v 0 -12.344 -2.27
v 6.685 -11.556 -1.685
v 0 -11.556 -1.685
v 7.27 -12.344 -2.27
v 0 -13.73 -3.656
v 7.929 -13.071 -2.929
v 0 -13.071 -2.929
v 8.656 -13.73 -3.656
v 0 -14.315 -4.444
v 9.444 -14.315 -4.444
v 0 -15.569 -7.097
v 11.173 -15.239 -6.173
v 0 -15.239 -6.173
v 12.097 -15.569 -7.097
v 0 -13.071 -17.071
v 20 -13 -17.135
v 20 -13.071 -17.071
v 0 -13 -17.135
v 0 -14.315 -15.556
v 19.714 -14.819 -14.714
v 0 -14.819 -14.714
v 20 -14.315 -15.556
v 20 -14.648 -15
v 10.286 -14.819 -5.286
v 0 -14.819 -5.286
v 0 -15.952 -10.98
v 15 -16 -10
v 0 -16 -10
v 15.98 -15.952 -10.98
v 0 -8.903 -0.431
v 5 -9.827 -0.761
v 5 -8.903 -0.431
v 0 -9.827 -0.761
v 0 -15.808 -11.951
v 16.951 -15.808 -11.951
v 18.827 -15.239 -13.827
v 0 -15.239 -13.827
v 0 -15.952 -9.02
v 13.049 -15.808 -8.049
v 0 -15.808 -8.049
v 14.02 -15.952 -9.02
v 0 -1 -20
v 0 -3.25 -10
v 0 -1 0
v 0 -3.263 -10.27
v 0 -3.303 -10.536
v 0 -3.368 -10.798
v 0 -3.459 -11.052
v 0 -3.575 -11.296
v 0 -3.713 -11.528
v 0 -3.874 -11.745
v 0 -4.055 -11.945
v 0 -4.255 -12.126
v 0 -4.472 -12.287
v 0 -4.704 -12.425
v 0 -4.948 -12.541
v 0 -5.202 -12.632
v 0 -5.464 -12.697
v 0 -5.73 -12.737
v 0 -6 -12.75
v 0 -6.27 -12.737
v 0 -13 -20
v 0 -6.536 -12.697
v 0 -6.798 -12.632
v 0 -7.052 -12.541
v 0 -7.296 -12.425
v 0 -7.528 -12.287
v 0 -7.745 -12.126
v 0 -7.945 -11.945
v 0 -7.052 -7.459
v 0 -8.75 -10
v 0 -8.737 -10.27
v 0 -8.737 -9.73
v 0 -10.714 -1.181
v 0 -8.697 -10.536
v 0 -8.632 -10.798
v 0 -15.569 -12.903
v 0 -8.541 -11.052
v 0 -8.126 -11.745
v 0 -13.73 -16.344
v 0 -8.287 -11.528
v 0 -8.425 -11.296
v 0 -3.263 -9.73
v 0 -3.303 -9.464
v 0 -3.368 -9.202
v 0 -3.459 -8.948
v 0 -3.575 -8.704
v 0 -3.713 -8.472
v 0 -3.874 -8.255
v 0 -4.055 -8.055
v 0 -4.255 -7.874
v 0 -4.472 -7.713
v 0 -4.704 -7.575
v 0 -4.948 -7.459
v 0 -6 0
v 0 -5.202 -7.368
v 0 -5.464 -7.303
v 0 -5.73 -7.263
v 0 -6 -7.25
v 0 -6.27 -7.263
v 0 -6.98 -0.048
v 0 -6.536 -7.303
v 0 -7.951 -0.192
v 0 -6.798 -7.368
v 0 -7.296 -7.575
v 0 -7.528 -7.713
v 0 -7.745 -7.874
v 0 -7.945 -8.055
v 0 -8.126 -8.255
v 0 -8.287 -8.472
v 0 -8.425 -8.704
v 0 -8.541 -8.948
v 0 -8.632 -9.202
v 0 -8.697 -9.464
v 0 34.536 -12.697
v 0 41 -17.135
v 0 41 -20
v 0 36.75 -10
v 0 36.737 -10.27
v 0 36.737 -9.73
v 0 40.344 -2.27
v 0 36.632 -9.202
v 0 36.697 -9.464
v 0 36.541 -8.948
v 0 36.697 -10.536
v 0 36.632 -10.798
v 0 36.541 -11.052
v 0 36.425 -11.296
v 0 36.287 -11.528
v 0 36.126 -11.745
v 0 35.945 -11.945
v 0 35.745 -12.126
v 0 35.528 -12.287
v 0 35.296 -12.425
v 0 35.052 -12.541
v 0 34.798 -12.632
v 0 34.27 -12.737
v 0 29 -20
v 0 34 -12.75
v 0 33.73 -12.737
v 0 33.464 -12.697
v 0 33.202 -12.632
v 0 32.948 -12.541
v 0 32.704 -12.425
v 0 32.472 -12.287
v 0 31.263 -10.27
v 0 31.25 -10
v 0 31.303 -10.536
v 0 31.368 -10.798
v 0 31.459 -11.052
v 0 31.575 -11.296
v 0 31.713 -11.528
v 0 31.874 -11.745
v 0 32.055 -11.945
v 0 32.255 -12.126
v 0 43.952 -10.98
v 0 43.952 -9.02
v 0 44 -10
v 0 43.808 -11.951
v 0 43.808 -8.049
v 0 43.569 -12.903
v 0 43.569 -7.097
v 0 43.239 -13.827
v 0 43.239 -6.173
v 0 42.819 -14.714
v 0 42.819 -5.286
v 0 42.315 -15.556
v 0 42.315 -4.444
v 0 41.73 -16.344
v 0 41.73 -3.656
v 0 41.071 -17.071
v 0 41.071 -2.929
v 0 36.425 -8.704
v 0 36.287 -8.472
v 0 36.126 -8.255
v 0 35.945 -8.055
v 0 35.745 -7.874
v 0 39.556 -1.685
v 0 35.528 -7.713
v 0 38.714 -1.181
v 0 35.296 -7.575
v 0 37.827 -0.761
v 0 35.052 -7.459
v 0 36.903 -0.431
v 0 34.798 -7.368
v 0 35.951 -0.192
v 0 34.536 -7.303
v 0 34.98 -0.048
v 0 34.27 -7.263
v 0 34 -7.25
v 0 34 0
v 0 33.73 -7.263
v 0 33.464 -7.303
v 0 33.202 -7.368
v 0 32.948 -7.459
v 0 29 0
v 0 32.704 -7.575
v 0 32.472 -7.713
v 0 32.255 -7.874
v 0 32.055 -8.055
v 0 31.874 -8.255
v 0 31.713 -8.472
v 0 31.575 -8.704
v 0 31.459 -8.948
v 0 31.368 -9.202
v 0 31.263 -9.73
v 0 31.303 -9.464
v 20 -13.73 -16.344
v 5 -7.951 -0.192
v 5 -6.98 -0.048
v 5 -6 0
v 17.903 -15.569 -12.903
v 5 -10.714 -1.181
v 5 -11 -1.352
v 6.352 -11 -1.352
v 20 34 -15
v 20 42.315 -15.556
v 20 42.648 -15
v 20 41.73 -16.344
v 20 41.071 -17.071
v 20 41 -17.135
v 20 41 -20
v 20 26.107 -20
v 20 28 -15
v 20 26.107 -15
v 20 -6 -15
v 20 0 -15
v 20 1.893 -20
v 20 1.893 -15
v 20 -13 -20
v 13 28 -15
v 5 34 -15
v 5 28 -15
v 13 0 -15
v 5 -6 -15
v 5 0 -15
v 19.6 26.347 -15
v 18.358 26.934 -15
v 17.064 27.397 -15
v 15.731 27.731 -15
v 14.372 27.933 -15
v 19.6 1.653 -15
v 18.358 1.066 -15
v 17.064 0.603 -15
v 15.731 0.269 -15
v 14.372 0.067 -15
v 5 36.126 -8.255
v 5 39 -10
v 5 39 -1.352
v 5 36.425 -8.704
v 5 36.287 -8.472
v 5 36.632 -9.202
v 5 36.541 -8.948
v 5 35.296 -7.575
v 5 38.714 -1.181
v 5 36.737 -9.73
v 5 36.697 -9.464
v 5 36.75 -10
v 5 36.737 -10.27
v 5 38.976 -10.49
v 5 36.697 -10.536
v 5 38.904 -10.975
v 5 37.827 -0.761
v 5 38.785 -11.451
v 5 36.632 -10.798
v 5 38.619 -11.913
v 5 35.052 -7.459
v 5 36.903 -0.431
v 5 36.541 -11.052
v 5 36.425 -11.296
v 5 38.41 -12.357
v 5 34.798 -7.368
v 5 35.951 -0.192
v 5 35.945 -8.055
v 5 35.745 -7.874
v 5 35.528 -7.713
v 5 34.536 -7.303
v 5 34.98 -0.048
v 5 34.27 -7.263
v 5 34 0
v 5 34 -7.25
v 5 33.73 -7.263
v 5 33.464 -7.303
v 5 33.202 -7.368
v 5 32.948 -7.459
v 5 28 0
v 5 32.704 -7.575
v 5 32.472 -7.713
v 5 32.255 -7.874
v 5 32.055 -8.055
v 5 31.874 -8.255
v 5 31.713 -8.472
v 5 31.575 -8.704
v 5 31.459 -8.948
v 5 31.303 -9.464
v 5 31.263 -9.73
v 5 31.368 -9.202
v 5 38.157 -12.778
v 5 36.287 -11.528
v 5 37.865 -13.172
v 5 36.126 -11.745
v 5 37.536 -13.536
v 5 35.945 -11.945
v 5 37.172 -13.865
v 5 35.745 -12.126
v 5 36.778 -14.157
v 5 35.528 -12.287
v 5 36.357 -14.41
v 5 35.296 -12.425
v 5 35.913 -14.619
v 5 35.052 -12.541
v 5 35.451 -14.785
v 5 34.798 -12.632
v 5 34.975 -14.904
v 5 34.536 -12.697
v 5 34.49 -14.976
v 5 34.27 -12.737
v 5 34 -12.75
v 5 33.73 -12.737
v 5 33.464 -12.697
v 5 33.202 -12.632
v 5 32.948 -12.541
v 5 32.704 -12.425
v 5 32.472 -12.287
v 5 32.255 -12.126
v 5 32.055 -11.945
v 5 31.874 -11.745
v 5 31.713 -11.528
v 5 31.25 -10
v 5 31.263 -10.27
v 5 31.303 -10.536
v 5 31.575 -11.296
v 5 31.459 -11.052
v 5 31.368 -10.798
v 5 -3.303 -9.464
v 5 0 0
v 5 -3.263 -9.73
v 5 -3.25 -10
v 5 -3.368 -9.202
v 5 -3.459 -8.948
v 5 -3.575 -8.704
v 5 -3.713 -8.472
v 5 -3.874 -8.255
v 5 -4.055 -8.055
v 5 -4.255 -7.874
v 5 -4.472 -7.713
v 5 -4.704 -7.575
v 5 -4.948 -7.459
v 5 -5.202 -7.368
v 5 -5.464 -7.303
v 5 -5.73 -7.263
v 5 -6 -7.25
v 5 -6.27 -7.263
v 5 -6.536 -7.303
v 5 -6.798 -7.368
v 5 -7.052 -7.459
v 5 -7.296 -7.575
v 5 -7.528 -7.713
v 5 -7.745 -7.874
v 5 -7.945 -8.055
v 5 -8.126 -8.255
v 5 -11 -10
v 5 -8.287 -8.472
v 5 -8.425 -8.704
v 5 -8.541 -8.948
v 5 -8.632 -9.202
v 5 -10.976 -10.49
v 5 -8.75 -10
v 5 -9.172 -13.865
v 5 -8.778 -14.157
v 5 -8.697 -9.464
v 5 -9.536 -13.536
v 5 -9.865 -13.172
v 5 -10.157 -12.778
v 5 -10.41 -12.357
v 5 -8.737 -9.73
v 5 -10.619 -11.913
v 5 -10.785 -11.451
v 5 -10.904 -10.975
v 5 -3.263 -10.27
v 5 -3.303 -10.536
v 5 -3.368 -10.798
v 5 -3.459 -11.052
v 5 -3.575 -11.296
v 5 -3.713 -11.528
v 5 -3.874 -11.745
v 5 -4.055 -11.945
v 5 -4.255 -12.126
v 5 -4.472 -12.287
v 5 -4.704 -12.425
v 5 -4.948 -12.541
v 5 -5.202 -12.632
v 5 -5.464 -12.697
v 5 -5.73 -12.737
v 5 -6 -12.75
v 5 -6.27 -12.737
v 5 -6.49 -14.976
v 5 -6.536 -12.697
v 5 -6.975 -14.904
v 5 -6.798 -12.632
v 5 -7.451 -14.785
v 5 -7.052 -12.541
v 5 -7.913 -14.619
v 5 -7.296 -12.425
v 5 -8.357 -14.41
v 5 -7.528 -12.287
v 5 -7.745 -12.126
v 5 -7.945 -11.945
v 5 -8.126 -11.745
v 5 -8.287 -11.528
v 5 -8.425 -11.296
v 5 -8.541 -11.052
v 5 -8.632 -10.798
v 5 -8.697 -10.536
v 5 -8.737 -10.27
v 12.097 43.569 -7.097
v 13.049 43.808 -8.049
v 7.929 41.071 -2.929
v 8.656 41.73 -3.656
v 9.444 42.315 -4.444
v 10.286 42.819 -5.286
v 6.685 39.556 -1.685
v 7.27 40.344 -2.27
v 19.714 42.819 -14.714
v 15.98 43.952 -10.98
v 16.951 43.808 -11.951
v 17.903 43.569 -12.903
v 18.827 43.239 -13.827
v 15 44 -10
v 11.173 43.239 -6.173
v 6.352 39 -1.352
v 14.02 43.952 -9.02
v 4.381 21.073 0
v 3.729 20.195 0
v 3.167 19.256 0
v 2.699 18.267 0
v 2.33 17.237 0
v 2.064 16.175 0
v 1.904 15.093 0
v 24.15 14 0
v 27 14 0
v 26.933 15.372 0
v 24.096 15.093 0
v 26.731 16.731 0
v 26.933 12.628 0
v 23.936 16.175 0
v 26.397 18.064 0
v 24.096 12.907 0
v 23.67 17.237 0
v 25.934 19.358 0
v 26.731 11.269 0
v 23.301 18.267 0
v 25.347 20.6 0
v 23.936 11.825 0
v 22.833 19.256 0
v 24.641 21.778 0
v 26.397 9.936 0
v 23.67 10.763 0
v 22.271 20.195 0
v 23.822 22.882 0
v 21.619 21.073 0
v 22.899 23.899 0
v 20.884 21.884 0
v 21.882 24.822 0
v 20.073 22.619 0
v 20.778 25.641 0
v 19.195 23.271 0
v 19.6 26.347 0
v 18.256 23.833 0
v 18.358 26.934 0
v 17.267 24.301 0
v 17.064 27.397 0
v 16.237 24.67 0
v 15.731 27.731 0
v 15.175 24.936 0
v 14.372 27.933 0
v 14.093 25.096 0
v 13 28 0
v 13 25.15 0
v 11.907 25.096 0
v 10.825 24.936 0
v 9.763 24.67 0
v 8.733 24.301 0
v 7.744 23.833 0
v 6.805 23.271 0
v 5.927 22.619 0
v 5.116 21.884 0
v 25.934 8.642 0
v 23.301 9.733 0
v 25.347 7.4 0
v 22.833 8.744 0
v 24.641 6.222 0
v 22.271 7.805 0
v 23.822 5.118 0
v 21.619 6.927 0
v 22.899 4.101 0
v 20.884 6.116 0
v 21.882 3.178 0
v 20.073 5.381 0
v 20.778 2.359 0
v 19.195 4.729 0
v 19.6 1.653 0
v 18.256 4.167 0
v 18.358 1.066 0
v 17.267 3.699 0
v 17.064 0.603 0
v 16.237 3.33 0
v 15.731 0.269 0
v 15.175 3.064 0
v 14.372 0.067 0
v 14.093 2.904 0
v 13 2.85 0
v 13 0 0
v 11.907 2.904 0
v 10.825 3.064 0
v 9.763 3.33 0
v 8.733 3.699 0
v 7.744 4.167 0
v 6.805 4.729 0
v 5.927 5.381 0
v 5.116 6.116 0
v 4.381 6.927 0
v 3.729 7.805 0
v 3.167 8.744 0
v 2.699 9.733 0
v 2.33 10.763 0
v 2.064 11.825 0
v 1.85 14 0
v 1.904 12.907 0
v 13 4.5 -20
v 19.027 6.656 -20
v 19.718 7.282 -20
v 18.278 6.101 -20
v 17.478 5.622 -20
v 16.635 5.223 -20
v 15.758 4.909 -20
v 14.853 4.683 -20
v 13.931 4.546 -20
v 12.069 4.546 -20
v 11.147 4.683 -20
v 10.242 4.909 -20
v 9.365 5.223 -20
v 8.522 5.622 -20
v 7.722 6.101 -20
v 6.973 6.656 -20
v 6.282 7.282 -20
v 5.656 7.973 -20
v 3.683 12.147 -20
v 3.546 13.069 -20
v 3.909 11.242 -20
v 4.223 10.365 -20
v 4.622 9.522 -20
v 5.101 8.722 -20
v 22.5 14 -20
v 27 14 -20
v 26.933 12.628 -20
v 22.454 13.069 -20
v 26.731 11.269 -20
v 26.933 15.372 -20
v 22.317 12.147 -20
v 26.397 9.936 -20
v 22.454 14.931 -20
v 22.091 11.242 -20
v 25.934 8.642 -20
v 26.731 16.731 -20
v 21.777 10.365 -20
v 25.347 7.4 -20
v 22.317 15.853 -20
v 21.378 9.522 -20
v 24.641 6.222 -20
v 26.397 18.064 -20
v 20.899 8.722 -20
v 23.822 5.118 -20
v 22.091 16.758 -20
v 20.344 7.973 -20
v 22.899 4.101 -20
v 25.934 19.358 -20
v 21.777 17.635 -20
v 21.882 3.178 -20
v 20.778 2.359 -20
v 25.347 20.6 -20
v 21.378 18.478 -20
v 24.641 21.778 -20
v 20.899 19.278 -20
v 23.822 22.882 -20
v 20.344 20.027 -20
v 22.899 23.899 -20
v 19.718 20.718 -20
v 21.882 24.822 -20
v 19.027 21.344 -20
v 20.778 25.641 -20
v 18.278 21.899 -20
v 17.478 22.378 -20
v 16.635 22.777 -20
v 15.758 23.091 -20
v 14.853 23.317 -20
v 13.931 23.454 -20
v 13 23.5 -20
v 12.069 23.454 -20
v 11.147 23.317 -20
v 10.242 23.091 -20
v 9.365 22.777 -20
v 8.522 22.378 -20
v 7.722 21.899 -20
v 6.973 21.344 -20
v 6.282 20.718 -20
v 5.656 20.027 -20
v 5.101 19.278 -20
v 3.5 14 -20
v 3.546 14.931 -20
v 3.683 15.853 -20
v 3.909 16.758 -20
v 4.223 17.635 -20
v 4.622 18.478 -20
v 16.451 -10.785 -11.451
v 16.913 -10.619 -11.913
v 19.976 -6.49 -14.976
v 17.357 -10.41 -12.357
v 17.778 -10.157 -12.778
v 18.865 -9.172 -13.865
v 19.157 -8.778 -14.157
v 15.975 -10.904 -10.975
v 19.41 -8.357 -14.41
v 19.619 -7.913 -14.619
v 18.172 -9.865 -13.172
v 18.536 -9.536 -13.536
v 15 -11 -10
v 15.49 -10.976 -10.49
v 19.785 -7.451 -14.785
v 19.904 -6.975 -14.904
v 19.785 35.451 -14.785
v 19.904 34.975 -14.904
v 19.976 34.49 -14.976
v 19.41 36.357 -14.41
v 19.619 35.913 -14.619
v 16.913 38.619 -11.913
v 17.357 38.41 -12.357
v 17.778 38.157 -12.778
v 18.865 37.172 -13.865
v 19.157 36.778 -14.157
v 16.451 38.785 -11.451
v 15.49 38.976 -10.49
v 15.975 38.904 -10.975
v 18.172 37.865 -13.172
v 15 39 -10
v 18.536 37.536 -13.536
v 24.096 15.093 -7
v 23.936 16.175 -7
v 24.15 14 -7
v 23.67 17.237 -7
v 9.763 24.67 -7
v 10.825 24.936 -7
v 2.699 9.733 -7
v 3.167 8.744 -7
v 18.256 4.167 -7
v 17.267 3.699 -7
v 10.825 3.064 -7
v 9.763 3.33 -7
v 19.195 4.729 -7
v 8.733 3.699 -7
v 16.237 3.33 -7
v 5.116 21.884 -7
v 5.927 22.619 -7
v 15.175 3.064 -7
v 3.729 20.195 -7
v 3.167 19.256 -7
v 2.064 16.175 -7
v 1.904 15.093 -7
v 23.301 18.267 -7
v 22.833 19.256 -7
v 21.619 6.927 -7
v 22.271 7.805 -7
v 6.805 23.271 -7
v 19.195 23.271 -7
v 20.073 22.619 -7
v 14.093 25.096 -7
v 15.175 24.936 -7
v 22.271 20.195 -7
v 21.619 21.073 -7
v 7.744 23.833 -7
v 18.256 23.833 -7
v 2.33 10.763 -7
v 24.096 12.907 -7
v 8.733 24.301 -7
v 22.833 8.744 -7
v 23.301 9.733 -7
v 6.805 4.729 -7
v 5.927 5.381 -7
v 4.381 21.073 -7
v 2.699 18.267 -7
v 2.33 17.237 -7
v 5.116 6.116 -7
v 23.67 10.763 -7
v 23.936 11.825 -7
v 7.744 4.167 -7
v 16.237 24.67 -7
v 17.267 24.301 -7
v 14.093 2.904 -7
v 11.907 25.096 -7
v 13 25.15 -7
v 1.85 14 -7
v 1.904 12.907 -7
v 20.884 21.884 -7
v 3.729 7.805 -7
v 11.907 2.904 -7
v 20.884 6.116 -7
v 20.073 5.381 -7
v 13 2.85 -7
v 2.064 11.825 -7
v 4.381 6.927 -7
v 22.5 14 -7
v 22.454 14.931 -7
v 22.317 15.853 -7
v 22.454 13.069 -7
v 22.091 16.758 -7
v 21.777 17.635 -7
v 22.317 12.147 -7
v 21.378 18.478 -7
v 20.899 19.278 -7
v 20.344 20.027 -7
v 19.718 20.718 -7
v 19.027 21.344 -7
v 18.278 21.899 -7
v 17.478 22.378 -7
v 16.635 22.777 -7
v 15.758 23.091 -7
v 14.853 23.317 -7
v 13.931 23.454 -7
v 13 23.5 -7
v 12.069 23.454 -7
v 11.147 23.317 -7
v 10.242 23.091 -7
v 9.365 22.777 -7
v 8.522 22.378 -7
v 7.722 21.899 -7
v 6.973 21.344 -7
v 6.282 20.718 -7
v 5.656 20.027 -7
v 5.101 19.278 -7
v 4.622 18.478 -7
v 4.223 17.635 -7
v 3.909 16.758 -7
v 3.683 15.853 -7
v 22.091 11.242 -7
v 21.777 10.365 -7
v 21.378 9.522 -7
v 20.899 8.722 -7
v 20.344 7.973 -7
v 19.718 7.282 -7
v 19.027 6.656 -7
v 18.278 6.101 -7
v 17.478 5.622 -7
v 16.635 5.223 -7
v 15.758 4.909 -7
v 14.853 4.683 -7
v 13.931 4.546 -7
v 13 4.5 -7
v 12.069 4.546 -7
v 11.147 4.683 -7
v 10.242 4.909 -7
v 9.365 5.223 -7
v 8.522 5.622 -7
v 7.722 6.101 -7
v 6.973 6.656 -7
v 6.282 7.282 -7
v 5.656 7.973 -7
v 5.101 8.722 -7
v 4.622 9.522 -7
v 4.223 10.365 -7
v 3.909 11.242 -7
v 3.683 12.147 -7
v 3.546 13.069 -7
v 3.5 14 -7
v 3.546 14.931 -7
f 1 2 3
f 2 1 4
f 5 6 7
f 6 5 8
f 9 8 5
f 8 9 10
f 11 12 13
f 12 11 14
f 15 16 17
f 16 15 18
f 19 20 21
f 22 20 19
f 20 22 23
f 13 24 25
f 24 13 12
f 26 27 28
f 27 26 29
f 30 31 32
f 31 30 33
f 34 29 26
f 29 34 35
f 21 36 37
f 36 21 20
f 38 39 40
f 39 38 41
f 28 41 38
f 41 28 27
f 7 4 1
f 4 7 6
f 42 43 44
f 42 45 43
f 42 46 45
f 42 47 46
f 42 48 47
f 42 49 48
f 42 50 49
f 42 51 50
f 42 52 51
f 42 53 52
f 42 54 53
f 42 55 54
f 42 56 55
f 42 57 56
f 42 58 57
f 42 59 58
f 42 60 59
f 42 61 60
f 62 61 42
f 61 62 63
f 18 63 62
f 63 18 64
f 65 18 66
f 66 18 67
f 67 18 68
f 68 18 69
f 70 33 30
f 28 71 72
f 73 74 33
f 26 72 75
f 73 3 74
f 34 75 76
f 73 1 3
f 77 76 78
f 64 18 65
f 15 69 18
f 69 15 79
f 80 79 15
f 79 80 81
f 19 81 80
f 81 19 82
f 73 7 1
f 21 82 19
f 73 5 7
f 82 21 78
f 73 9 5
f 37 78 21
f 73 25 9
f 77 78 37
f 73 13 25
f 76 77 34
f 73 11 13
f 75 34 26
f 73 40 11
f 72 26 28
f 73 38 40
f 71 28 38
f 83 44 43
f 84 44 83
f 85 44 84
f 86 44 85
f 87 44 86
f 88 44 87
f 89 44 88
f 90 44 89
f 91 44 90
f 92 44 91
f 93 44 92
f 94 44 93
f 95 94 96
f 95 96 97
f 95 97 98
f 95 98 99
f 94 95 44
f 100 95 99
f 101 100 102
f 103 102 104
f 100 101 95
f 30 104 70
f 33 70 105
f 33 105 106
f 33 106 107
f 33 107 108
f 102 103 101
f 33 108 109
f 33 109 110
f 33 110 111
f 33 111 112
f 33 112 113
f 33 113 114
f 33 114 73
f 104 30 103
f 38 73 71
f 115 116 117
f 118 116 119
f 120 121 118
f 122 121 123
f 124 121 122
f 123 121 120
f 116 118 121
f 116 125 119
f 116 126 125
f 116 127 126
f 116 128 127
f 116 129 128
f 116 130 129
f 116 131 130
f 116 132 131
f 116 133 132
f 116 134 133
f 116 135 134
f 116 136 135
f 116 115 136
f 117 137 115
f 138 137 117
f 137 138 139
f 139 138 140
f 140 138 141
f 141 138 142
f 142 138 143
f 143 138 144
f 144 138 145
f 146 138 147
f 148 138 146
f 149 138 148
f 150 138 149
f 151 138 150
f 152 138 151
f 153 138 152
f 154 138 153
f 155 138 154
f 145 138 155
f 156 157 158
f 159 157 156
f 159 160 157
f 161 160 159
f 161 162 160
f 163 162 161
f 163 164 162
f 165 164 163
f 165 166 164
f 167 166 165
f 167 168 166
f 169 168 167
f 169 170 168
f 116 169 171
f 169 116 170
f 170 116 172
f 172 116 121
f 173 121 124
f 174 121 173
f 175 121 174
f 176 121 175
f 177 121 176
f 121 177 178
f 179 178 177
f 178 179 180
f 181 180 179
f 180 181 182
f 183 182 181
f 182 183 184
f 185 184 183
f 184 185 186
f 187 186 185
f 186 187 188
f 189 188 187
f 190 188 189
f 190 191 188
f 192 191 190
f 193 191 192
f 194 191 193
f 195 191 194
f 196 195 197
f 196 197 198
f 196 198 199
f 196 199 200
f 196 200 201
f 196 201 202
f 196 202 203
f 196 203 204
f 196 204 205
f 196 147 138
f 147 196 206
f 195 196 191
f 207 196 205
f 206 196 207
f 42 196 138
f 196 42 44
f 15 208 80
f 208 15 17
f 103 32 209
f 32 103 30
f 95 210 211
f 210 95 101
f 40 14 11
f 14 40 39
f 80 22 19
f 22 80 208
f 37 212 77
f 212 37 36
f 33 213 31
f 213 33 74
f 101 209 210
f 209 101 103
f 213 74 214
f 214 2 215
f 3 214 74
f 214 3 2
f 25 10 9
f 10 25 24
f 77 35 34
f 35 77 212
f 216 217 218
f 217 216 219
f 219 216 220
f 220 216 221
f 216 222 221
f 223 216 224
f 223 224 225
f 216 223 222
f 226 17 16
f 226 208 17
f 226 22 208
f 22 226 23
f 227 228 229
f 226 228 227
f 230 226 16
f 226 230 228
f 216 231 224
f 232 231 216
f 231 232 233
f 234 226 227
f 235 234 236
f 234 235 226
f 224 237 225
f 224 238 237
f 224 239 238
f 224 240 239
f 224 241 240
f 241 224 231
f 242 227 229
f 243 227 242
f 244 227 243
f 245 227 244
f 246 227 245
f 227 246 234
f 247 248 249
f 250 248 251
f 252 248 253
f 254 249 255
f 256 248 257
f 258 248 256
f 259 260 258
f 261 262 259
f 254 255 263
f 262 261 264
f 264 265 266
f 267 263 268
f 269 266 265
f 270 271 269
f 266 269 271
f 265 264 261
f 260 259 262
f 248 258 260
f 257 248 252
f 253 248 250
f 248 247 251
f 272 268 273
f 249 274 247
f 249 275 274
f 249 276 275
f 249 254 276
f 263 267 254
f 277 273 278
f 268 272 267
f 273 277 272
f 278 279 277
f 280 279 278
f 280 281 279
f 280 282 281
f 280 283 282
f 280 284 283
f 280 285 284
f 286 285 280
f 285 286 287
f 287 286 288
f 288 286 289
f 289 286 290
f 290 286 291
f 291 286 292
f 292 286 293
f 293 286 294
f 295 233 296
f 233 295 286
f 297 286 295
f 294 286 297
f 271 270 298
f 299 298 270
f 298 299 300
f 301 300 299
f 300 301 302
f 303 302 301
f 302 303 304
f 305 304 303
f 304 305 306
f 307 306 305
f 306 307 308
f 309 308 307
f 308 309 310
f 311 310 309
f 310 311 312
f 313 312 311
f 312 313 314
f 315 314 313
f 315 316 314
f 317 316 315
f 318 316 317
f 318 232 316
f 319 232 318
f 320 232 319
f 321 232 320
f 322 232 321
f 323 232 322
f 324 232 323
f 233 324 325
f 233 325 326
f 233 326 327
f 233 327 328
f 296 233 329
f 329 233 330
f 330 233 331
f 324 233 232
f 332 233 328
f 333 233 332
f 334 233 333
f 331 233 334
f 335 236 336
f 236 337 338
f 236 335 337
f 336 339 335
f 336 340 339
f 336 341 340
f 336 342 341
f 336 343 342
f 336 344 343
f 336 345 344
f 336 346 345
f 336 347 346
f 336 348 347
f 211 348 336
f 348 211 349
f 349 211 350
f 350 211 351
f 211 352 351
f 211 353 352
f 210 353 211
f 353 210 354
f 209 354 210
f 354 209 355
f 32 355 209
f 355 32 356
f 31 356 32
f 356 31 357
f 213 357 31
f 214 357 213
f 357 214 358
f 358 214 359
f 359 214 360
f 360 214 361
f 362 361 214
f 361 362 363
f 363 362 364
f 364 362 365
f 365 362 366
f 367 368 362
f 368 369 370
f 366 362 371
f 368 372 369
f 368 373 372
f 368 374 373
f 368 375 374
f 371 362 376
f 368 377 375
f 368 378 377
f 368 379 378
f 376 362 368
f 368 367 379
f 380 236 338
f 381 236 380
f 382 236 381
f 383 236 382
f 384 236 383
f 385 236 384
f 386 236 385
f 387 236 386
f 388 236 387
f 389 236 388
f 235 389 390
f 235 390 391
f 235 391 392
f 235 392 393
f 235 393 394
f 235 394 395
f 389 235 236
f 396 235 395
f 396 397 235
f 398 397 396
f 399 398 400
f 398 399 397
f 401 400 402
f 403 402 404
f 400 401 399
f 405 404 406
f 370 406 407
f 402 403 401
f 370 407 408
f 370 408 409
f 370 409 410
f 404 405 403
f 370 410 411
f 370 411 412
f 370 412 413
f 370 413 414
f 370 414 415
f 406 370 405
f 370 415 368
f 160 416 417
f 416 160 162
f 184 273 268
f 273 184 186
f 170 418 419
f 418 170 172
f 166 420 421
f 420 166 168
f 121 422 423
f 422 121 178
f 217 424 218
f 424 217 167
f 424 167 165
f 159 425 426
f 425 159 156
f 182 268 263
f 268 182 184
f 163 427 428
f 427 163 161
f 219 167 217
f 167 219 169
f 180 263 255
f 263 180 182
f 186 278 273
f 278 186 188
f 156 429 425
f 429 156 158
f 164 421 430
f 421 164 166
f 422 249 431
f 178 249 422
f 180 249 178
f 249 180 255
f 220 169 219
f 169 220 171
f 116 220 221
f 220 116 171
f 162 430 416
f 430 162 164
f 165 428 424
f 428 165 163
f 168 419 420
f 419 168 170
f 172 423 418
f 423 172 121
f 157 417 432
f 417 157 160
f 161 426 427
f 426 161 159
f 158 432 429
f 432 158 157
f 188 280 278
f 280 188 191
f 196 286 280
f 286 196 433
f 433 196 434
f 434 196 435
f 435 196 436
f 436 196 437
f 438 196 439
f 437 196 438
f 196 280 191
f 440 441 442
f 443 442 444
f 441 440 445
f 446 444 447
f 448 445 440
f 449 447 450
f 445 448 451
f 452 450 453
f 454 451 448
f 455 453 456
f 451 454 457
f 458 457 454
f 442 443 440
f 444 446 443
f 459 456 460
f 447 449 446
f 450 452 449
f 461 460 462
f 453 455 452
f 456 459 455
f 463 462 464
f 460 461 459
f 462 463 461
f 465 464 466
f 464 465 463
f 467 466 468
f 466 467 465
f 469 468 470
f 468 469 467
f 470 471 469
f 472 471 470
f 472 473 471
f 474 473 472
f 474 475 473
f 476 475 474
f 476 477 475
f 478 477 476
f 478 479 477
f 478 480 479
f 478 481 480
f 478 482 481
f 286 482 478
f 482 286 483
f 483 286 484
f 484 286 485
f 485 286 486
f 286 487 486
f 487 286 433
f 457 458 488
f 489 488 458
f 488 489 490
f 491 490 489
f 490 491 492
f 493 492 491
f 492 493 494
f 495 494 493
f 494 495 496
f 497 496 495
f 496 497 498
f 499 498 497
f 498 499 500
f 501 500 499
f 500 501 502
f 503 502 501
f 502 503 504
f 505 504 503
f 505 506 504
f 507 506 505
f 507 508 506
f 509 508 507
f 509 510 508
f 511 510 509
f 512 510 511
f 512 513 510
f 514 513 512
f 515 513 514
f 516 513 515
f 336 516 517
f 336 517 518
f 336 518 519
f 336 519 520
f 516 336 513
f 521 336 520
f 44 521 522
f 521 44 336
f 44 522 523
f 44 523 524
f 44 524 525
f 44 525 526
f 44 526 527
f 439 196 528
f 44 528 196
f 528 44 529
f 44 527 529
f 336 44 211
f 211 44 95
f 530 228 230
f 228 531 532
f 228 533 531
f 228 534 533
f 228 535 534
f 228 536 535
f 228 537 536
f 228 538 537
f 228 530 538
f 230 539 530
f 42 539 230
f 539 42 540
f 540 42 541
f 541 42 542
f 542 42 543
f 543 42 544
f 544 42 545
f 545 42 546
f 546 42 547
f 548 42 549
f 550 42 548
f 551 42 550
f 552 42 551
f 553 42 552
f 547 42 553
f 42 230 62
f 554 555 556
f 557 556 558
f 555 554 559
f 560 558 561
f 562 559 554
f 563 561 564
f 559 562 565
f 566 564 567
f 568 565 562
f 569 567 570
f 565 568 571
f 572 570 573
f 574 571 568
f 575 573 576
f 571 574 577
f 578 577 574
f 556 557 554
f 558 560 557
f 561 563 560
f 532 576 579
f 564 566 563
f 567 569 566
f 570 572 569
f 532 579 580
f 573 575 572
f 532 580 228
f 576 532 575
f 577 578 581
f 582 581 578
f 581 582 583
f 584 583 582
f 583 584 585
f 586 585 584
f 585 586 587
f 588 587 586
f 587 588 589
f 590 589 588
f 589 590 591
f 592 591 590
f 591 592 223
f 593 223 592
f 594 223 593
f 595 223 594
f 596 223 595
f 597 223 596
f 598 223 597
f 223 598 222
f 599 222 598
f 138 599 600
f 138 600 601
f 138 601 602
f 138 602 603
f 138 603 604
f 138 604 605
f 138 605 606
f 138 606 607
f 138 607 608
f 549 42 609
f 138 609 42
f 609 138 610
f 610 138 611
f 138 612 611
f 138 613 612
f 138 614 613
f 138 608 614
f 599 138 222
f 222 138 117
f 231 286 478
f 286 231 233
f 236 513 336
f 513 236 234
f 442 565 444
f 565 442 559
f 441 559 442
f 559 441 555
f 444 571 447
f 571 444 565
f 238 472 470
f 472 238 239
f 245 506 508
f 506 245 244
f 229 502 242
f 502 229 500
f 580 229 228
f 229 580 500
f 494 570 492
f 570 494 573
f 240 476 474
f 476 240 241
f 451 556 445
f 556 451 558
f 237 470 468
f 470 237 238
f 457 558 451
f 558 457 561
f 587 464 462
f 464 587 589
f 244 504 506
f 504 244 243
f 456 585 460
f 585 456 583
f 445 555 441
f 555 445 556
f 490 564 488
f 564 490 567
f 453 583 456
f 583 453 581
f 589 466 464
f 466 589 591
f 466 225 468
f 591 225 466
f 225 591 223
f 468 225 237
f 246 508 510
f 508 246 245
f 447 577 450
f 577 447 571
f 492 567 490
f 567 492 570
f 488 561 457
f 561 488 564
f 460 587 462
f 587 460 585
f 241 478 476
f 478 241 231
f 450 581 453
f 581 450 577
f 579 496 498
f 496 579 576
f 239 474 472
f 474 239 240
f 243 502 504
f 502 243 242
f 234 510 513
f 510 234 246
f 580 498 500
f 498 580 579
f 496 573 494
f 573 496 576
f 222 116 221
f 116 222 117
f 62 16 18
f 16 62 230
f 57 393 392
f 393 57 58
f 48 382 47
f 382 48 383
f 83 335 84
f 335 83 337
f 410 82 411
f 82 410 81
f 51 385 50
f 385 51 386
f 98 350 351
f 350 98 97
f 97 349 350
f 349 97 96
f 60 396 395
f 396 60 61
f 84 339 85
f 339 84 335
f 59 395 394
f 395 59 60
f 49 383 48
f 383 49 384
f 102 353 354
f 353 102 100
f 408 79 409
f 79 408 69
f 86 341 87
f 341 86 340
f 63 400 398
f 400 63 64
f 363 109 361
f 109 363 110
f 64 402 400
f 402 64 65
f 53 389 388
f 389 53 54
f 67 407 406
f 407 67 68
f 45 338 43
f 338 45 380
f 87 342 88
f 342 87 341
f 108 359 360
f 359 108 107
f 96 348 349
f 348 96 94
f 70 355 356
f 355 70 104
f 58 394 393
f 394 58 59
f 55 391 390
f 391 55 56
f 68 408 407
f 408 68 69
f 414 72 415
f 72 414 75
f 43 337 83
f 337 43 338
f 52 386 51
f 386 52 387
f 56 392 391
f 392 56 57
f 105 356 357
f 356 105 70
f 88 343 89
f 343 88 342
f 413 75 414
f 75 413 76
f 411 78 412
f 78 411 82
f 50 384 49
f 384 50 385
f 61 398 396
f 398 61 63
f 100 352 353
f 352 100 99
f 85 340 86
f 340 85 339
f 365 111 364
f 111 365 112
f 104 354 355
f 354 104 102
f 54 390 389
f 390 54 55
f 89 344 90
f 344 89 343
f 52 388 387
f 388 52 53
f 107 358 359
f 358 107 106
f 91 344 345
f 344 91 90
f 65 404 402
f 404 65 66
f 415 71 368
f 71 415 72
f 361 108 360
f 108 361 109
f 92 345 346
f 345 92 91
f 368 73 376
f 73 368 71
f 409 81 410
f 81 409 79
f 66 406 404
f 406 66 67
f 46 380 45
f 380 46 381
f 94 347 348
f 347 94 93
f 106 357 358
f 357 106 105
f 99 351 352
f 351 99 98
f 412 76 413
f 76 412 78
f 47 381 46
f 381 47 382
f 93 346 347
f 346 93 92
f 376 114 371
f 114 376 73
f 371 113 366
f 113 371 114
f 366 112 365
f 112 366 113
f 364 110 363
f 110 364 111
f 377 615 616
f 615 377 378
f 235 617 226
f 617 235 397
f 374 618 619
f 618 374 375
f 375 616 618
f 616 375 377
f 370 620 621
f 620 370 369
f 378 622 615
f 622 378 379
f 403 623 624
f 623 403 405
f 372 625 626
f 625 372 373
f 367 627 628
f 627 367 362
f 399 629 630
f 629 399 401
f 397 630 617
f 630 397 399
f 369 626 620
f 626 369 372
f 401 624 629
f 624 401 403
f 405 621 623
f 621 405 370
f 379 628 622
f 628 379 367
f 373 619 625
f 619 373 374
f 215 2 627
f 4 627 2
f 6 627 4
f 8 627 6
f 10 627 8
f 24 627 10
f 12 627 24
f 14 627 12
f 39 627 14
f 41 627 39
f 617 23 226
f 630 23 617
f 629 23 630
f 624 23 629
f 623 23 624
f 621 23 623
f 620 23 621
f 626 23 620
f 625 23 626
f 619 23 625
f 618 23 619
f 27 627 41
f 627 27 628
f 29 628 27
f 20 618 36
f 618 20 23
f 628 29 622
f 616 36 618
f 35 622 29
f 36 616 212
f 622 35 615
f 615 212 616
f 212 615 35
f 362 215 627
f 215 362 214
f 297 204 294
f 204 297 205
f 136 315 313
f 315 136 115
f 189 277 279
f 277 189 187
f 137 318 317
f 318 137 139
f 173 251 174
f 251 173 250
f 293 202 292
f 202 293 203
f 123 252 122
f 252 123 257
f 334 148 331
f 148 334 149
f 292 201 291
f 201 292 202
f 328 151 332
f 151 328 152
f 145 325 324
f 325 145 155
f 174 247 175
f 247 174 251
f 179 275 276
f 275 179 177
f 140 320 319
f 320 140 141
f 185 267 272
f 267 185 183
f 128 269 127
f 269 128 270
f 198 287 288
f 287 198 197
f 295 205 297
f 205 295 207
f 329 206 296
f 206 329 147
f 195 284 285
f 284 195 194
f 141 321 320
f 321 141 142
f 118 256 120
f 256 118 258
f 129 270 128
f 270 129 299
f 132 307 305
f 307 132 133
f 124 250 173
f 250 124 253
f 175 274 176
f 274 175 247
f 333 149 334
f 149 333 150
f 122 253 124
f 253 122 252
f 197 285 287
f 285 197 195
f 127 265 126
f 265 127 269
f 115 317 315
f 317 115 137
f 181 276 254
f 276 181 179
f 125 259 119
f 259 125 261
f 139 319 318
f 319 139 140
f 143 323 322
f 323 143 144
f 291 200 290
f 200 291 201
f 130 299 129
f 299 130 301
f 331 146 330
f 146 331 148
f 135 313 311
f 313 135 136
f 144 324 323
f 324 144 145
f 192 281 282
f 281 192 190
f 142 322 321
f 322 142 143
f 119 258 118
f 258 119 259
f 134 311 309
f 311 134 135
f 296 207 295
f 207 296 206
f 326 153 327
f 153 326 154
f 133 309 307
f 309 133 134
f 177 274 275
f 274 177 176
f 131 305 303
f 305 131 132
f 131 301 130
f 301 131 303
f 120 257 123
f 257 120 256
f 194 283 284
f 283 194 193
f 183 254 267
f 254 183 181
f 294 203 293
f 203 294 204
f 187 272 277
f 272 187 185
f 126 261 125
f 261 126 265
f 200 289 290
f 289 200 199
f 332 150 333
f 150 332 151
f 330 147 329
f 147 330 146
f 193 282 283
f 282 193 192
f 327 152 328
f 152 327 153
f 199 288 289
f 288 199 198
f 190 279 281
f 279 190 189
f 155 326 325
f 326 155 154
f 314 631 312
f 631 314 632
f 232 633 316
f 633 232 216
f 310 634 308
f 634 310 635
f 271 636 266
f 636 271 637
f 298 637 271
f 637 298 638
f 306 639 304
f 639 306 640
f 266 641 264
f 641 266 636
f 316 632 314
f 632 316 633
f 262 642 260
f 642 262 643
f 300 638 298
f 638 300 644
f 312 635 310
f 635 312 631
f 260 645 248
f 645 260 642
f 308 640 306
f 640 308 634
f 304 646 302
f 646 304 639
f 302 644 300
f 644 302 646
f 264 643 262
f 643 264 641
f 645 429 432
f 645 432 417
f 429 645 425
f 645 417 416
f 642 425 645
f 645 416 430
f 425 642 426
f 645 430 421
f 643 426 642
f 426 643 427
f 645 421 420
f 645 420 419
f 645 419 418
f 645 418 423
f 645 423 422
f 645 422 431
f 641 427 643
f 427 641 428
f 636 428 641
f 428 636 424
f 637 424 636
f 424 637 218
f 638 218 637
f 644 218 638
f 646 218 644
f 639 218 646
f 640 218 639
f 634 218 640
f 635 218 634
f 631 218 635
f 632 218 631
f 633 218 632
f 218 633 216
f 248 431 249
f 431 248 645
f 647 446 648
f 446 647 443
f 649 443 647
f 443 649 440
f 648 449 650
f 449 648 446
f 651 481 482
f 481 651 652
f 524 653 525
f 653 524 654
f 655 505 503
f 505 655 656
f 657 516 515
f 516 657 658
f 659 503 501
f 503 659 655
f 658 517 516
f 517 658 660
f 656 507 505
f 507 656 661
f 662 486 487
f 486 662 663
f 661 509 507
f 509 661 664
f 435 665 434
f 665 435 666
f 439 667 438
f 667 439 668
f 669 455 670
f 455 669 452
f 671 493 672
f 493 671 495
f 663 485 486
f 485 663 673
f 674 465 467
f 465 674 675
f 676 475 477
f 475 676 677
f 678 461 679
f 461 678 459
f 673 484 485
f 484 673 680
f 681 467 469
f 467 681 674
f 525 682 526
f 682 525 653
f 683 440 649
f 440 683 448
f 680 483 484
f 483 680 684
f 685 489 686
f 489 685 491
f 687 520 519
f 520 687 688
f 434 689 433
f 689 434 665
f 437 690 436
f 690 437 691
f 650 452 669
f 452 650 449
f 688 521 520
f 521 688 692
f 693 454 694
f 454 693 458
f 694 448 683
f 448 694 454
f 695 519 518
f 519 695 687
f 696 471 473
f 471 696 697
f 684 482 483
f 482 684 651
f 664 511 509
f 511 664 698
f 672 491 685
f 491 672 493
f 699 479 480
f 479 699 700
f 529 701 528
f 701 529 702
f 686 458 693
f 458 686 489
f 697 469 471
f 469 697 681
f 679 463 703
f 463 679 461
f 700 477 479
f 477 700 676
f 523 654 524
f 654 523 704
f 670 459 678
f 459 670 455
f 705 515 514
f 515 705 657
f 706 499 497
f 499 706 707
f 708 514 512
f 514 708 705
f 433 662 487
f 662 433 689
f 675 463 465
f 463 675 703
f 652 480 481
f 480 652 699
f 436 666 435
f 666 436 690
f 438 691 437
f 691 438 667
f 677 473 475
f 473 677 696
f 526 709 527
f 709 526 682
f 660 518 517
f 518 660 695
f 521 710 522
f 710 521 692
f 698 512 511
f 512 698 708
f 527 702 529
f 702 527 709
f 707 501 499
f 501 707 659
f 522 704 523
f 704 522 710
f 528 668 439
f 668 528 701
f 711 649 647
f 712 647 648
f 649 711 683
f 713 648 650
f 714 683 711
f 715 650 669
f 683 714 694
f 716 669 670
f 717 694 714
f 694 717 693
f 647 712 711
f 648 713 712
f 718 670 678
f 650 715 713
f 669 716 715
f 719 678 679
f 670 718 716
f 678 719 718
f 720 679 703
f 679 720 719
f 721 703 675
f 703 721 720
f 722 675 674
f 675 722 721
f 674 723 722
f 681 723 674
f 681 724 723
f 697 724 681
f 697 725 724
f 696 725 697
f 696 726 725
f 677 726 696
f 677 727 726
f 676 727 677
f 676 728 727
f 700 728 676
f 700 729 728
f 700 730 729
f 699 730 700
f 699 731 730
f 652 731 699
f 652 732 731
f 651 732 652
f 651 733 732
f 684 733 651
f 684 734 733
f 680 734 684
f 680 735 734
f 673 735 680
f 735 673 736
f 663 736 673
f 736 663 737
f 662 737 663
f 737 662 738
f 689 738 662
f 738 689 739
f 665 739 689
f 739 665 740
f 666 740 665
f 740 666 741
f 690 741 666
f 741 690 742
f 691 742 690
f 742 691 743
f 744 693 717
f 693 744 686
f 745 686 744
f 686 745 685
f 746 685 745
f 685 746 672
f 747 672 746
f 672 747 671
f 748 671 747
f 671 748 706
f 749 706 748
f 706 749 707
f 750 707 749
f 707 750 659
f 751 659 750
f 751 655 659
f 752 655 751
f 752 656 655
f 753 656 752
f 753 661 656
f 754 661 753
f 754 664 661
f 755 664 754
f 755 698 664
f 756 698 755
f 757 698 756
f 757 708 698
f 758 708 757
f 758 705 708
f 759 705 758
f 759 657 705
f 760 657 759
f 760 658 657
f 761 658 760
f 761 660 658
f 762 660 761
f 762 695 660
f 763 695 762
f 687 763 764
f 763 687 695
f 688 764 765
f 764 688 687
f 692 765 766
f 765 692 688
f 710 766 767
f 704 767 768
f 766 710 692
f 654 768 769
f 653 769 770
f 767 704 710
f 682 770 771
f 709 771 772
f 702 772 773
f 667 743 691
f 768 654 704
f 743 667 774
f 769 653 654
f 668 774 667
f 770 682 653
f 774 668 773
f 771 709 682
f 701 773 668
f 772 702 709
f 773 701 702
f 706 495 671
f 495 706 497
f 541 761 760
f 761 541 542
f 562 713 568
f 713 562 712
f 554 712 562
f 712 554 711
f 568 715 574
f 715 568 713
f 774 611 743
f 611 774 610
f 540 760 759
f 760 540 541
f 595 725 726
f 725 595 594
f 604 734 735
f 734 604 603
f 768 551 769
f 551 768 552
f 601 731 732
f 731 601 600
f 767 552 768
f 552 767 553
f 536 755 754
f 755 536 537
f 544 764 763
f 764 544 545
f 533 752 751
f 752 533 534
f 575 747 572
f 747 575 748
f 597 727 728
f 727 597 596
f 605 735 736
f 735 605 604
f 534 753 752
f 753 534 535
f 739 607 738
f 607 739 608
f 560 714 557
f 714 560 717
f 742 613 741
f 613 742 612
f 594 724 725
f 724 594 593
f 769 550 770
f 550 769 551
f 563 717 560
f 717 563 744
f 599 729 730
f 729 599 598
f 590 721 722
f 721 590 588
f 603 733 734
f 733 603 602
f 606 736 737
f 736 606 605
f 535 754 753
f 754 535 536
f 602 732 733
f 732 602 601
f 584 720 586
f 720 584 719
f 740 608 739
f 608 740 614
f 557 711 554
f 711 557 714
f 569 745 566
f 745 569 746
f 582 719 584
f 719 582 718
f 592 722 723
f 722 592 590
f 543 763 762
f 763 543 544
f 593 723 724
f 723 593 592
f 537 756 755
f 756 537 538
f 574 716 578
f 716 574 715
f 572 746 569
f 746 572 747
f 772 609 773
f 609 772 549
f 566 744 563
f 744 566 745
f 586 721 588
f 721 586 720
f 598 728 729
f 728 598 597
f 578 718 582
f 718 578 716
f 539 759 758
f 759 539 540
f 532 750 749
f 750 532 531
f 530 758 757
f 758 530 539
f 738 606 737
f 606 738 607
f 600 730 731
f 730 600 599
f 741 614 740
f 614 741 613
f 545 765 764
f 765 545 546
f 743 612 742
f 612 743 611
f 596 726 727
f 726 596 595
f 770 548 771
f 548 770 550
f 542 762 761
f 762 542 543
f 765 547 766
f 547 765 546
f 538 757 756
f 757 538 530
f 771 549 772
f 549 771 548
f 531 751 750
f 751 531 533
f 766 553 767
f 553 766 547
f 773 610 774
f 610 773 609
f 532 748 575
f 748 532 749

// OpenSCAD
// file: Profiles.scad
module profileI5(l) {
    color("Silver") render(convexity=8) linear_extrude(height=l, convexity=8) {
        difference() {
            union() {
                for(i=[-1, 1]) {
                    for(j=[-1, 1]) {
                        translate([i*8, j*8, 0]) circle(d=4, $fn=12);
                        translate([i*(10-1.58/2), j*(2.5+5.5/2), 0]) square([1.58, 5.5], center=true);
                        translate([i*(2.5+5.5/2), j*(10-1.58/2), 0]) square([5.5, 1.58], center=true);
                        translate([i*(5.55+1.5/2), j*(10-1.58-1.5/3), 0]) square([1.5, 1.5], center=true);
                        translate([i*(10-1.58-1.5/3), j*(5.55+1.5/2), 0]) square([1.5, 1.5], center=true);
                    }
                    rotate([0, 0, i*45]) square([20, 1.5], center=true);
                }
                square([2*(10-6.35), 2*(10-6.35)], center=true);
            }
            circle(d=4.3, $fn=16);
            for(i=[-1, 1]) {
                for(j=[-1, 1]) {
                    translate([i*5.55, j*(10-1.58-1.5/2), 0]) circle(d=1.5, $fn=8);
                    translate([i*(10-1.58-1.5/2), j*5.55, 0]) circle(d=1.5, $fn=8);
                }
            }
        }
    }
}

profileI5(50);
// file: NormParts.scad
res = 32;

module igidur5mm() {
    d1 = 5;
    d2 = 7;
    b1 = 4.6;
    color("Yellow") render(convexity=4) {
        difference() {
            cylinder(d=d2, h=b1, $fn=res);
            translate([0, 0, -1]) cylinder(d=d1, h=b1+2, $fn=res);
        }
    }
}

module igidur8mm() {
    d1 = 8;
    d2 = 10;
    b1 = 8;
    color("Yellow") render(convexity=4) {
        difference() {
            cylinder(d=d2, h=b1, $fn=res);
            translate([0, 0, -1]) cylinder(d=d1, h=b1+2, $fn=res);
        }
    }
}

module pulley20teeth(inner_d) {
    color("Silver") render(convexity=4) {
        difference() {
            union() {
                cylinder(d=17, h=8, $fn=res);
                cylinder(d=14, h=15.95, $fn=res);
                translate([0, 0, 15]) cylinder(d=17, h=0.95, $fn=res);
            }
            translate([0, 0, -1]) cylinder(d=inner_d, h=15.95+2, $fn=res);
        }
    }
}

module jhead_hotend() {
    color("Silver") render(convexity=6) {
        cylinder(h=12.77, d=12, $fn=res);
        cylinder(h=2.8, d=16, $fn=res);
        translate([0, 0, 6+2.8]) cylinder(h=12.77-6-2.8, d=16, $fn=res);
        translate([0, 0, 12.77]) cylinder(h=6.2, d=11.42, $fn=6);
        for(i=[0:10]) {
            translate([0, 0, -4.2-26+i*(26/11)]) cylinder(h=1.14, d=22.3, $fn=res);
        }
        translate([0, 0, -3]) cylinder(h=1.14, d=16, $fn=res);
        translate([0, 0, -4.2-26]) cylinder(h=26+4.2, d1=11.4, d2=7.6, $fn=res);
        translate([0, 0, -48]) cylinder(h=72.7, d=3, $fn=res);
        translate([0, 5, -4.2-26-3.34-12/2]) cube([15.86, 20, 12], center=true);
        translate([0, 0, -48]) cylinder(h=3, d=8, $fn=6);
        translate([0, 0, -48-2.65]) cylinder(h=2.65, d1=0.5, d2=4.9, $fn=res);
        translate([0, 0, 72.7-48-1.5]) cylinder(h=1.5, d=10, $fn=res);
    }
}

module heatbed() {
    color("Silver") render(convexity=4) difference() {
        union() {
            for(i=[0, 1]) {
                for(j=[0, 1]) {
                    translate([5+i*(219.5-10), 5+j*(219.5-10), 0]) cylinder(r=5, h=3.1, $fn=res);
                }
            }
            translate([5, 0, 0]) cube([219.5-10, 219.5, 3.1]);
            translate([0, 5, 0]) cube([219.5, 219.5-10, 3.1]);
        }
        for(i=[0, 1]) {
            for(j=[0, 1]) {
                translate([0, 0, 0]) {
                    translate([5.7+i*(219.5-11.4), 5.7+j*(219.5-11.4), 3.1-1.86]) cylinder(d=6, h=3, $fn=res);
                    translate([5.7+i*(219.5-11.4), 5.7+j*(219.5-11.4), -0.5]) cylinder(d=3.37, h=5, $fn=res);
                }
            }
        }
    }
}

module spindle() {
    color("Silver") cylinder(d=8, h=300, $fn=res);
}

module spindle_screw() {
    color("Silver") difference() {
        union() {
            translate([0, 0, -5.15]) cylinder(d=10, h=15, $fn=res);
            translate([0, 0, -3.55]) cylinder(d=21.92, h=3.55, $fn=res);
        }
        translate([0, 0, -6]) cylinder(d=7, h=17, $fn=res);
        for(i=[-1, 1]) {
            translate([i*(21.92/2-1.2-3.6/2), 0, -4]) cylinder(d=3.6, h=5, $fn=res);
            translate([0, i*(21.92/2-1.2-3.6/2), -4]) cylinder(d=3.6, h=5, $fn=res);
        }
    }
}

module ballbearing608() {
    color("Silver") render(convexity=4) difference() {
        cylinder(d=22, h=7, $fn=res);
        translate([0, 0, -1]) cylinder(d=8, h=9, $fn=res);
    }
}
// main file
use <NormParts.scad>
use <Profiles.scad>
res = 64;

module XY_bearing_holder() {
    render(convexity=4) difference() {
        union() {
            translate([0, 0, -20]) cube([13, 28, 20]);
            translate([13, 14, -20]) cylinder(d=28, h=20, $fn=res);
            for(i=[-1, 1]) {
                difference() {
                    translate([0, 20*i+14, -10]) rotate([0, 90, 0]) cylinder(d=20, h=20, $fn=res);
                    translate([5+7.5, 15*i+4+10, -7.5]) cube([15, 6, 15], center=true);
                }
            }
            translate([0, -6, -20]) cube([5, 20+2*10, 20]);
            translate([0, -13, -20]) cube([20, 20+2*17, 5]);
        }
        translate([-10, -1, -21]) cube([10, 30, 22]);
        translate([13, 14, -7]) cylinder(d=22.3, h=19, $fn=res);
        translate([13, 14, -21]) cylinder(d=19, h=22, $fn=res);
        for(i=[-1, 1]) {
            translate([-1, 20*i+14, -10]) rotate([0, 90, 0]) cylinder(d=5.5, h=22, $fn=res);
            translate([5, 20*i+14, -10]) rotate([0, 90, 0]) cylinder(d=10, h=22, $fn=res);
            translate([5, 24.5*i+3.5, 0]) rotate([0, 45, 0]) cube([30, 21, 30]);
            translate([5+7.5, 17*i+4+10, -7.5]) cube([15, 6, 15], center=true);
            translate([5+7.5, 20*i+4+10, -5]) cube([15, 10, 10], center=true);
        }
    }
}

XY_bearing_holder();
//#translate([13, 14, -7]) ballbearing608();
//translate([-10, -30, -10]) rotate([-90, 0, 0]) profileI5(90);
